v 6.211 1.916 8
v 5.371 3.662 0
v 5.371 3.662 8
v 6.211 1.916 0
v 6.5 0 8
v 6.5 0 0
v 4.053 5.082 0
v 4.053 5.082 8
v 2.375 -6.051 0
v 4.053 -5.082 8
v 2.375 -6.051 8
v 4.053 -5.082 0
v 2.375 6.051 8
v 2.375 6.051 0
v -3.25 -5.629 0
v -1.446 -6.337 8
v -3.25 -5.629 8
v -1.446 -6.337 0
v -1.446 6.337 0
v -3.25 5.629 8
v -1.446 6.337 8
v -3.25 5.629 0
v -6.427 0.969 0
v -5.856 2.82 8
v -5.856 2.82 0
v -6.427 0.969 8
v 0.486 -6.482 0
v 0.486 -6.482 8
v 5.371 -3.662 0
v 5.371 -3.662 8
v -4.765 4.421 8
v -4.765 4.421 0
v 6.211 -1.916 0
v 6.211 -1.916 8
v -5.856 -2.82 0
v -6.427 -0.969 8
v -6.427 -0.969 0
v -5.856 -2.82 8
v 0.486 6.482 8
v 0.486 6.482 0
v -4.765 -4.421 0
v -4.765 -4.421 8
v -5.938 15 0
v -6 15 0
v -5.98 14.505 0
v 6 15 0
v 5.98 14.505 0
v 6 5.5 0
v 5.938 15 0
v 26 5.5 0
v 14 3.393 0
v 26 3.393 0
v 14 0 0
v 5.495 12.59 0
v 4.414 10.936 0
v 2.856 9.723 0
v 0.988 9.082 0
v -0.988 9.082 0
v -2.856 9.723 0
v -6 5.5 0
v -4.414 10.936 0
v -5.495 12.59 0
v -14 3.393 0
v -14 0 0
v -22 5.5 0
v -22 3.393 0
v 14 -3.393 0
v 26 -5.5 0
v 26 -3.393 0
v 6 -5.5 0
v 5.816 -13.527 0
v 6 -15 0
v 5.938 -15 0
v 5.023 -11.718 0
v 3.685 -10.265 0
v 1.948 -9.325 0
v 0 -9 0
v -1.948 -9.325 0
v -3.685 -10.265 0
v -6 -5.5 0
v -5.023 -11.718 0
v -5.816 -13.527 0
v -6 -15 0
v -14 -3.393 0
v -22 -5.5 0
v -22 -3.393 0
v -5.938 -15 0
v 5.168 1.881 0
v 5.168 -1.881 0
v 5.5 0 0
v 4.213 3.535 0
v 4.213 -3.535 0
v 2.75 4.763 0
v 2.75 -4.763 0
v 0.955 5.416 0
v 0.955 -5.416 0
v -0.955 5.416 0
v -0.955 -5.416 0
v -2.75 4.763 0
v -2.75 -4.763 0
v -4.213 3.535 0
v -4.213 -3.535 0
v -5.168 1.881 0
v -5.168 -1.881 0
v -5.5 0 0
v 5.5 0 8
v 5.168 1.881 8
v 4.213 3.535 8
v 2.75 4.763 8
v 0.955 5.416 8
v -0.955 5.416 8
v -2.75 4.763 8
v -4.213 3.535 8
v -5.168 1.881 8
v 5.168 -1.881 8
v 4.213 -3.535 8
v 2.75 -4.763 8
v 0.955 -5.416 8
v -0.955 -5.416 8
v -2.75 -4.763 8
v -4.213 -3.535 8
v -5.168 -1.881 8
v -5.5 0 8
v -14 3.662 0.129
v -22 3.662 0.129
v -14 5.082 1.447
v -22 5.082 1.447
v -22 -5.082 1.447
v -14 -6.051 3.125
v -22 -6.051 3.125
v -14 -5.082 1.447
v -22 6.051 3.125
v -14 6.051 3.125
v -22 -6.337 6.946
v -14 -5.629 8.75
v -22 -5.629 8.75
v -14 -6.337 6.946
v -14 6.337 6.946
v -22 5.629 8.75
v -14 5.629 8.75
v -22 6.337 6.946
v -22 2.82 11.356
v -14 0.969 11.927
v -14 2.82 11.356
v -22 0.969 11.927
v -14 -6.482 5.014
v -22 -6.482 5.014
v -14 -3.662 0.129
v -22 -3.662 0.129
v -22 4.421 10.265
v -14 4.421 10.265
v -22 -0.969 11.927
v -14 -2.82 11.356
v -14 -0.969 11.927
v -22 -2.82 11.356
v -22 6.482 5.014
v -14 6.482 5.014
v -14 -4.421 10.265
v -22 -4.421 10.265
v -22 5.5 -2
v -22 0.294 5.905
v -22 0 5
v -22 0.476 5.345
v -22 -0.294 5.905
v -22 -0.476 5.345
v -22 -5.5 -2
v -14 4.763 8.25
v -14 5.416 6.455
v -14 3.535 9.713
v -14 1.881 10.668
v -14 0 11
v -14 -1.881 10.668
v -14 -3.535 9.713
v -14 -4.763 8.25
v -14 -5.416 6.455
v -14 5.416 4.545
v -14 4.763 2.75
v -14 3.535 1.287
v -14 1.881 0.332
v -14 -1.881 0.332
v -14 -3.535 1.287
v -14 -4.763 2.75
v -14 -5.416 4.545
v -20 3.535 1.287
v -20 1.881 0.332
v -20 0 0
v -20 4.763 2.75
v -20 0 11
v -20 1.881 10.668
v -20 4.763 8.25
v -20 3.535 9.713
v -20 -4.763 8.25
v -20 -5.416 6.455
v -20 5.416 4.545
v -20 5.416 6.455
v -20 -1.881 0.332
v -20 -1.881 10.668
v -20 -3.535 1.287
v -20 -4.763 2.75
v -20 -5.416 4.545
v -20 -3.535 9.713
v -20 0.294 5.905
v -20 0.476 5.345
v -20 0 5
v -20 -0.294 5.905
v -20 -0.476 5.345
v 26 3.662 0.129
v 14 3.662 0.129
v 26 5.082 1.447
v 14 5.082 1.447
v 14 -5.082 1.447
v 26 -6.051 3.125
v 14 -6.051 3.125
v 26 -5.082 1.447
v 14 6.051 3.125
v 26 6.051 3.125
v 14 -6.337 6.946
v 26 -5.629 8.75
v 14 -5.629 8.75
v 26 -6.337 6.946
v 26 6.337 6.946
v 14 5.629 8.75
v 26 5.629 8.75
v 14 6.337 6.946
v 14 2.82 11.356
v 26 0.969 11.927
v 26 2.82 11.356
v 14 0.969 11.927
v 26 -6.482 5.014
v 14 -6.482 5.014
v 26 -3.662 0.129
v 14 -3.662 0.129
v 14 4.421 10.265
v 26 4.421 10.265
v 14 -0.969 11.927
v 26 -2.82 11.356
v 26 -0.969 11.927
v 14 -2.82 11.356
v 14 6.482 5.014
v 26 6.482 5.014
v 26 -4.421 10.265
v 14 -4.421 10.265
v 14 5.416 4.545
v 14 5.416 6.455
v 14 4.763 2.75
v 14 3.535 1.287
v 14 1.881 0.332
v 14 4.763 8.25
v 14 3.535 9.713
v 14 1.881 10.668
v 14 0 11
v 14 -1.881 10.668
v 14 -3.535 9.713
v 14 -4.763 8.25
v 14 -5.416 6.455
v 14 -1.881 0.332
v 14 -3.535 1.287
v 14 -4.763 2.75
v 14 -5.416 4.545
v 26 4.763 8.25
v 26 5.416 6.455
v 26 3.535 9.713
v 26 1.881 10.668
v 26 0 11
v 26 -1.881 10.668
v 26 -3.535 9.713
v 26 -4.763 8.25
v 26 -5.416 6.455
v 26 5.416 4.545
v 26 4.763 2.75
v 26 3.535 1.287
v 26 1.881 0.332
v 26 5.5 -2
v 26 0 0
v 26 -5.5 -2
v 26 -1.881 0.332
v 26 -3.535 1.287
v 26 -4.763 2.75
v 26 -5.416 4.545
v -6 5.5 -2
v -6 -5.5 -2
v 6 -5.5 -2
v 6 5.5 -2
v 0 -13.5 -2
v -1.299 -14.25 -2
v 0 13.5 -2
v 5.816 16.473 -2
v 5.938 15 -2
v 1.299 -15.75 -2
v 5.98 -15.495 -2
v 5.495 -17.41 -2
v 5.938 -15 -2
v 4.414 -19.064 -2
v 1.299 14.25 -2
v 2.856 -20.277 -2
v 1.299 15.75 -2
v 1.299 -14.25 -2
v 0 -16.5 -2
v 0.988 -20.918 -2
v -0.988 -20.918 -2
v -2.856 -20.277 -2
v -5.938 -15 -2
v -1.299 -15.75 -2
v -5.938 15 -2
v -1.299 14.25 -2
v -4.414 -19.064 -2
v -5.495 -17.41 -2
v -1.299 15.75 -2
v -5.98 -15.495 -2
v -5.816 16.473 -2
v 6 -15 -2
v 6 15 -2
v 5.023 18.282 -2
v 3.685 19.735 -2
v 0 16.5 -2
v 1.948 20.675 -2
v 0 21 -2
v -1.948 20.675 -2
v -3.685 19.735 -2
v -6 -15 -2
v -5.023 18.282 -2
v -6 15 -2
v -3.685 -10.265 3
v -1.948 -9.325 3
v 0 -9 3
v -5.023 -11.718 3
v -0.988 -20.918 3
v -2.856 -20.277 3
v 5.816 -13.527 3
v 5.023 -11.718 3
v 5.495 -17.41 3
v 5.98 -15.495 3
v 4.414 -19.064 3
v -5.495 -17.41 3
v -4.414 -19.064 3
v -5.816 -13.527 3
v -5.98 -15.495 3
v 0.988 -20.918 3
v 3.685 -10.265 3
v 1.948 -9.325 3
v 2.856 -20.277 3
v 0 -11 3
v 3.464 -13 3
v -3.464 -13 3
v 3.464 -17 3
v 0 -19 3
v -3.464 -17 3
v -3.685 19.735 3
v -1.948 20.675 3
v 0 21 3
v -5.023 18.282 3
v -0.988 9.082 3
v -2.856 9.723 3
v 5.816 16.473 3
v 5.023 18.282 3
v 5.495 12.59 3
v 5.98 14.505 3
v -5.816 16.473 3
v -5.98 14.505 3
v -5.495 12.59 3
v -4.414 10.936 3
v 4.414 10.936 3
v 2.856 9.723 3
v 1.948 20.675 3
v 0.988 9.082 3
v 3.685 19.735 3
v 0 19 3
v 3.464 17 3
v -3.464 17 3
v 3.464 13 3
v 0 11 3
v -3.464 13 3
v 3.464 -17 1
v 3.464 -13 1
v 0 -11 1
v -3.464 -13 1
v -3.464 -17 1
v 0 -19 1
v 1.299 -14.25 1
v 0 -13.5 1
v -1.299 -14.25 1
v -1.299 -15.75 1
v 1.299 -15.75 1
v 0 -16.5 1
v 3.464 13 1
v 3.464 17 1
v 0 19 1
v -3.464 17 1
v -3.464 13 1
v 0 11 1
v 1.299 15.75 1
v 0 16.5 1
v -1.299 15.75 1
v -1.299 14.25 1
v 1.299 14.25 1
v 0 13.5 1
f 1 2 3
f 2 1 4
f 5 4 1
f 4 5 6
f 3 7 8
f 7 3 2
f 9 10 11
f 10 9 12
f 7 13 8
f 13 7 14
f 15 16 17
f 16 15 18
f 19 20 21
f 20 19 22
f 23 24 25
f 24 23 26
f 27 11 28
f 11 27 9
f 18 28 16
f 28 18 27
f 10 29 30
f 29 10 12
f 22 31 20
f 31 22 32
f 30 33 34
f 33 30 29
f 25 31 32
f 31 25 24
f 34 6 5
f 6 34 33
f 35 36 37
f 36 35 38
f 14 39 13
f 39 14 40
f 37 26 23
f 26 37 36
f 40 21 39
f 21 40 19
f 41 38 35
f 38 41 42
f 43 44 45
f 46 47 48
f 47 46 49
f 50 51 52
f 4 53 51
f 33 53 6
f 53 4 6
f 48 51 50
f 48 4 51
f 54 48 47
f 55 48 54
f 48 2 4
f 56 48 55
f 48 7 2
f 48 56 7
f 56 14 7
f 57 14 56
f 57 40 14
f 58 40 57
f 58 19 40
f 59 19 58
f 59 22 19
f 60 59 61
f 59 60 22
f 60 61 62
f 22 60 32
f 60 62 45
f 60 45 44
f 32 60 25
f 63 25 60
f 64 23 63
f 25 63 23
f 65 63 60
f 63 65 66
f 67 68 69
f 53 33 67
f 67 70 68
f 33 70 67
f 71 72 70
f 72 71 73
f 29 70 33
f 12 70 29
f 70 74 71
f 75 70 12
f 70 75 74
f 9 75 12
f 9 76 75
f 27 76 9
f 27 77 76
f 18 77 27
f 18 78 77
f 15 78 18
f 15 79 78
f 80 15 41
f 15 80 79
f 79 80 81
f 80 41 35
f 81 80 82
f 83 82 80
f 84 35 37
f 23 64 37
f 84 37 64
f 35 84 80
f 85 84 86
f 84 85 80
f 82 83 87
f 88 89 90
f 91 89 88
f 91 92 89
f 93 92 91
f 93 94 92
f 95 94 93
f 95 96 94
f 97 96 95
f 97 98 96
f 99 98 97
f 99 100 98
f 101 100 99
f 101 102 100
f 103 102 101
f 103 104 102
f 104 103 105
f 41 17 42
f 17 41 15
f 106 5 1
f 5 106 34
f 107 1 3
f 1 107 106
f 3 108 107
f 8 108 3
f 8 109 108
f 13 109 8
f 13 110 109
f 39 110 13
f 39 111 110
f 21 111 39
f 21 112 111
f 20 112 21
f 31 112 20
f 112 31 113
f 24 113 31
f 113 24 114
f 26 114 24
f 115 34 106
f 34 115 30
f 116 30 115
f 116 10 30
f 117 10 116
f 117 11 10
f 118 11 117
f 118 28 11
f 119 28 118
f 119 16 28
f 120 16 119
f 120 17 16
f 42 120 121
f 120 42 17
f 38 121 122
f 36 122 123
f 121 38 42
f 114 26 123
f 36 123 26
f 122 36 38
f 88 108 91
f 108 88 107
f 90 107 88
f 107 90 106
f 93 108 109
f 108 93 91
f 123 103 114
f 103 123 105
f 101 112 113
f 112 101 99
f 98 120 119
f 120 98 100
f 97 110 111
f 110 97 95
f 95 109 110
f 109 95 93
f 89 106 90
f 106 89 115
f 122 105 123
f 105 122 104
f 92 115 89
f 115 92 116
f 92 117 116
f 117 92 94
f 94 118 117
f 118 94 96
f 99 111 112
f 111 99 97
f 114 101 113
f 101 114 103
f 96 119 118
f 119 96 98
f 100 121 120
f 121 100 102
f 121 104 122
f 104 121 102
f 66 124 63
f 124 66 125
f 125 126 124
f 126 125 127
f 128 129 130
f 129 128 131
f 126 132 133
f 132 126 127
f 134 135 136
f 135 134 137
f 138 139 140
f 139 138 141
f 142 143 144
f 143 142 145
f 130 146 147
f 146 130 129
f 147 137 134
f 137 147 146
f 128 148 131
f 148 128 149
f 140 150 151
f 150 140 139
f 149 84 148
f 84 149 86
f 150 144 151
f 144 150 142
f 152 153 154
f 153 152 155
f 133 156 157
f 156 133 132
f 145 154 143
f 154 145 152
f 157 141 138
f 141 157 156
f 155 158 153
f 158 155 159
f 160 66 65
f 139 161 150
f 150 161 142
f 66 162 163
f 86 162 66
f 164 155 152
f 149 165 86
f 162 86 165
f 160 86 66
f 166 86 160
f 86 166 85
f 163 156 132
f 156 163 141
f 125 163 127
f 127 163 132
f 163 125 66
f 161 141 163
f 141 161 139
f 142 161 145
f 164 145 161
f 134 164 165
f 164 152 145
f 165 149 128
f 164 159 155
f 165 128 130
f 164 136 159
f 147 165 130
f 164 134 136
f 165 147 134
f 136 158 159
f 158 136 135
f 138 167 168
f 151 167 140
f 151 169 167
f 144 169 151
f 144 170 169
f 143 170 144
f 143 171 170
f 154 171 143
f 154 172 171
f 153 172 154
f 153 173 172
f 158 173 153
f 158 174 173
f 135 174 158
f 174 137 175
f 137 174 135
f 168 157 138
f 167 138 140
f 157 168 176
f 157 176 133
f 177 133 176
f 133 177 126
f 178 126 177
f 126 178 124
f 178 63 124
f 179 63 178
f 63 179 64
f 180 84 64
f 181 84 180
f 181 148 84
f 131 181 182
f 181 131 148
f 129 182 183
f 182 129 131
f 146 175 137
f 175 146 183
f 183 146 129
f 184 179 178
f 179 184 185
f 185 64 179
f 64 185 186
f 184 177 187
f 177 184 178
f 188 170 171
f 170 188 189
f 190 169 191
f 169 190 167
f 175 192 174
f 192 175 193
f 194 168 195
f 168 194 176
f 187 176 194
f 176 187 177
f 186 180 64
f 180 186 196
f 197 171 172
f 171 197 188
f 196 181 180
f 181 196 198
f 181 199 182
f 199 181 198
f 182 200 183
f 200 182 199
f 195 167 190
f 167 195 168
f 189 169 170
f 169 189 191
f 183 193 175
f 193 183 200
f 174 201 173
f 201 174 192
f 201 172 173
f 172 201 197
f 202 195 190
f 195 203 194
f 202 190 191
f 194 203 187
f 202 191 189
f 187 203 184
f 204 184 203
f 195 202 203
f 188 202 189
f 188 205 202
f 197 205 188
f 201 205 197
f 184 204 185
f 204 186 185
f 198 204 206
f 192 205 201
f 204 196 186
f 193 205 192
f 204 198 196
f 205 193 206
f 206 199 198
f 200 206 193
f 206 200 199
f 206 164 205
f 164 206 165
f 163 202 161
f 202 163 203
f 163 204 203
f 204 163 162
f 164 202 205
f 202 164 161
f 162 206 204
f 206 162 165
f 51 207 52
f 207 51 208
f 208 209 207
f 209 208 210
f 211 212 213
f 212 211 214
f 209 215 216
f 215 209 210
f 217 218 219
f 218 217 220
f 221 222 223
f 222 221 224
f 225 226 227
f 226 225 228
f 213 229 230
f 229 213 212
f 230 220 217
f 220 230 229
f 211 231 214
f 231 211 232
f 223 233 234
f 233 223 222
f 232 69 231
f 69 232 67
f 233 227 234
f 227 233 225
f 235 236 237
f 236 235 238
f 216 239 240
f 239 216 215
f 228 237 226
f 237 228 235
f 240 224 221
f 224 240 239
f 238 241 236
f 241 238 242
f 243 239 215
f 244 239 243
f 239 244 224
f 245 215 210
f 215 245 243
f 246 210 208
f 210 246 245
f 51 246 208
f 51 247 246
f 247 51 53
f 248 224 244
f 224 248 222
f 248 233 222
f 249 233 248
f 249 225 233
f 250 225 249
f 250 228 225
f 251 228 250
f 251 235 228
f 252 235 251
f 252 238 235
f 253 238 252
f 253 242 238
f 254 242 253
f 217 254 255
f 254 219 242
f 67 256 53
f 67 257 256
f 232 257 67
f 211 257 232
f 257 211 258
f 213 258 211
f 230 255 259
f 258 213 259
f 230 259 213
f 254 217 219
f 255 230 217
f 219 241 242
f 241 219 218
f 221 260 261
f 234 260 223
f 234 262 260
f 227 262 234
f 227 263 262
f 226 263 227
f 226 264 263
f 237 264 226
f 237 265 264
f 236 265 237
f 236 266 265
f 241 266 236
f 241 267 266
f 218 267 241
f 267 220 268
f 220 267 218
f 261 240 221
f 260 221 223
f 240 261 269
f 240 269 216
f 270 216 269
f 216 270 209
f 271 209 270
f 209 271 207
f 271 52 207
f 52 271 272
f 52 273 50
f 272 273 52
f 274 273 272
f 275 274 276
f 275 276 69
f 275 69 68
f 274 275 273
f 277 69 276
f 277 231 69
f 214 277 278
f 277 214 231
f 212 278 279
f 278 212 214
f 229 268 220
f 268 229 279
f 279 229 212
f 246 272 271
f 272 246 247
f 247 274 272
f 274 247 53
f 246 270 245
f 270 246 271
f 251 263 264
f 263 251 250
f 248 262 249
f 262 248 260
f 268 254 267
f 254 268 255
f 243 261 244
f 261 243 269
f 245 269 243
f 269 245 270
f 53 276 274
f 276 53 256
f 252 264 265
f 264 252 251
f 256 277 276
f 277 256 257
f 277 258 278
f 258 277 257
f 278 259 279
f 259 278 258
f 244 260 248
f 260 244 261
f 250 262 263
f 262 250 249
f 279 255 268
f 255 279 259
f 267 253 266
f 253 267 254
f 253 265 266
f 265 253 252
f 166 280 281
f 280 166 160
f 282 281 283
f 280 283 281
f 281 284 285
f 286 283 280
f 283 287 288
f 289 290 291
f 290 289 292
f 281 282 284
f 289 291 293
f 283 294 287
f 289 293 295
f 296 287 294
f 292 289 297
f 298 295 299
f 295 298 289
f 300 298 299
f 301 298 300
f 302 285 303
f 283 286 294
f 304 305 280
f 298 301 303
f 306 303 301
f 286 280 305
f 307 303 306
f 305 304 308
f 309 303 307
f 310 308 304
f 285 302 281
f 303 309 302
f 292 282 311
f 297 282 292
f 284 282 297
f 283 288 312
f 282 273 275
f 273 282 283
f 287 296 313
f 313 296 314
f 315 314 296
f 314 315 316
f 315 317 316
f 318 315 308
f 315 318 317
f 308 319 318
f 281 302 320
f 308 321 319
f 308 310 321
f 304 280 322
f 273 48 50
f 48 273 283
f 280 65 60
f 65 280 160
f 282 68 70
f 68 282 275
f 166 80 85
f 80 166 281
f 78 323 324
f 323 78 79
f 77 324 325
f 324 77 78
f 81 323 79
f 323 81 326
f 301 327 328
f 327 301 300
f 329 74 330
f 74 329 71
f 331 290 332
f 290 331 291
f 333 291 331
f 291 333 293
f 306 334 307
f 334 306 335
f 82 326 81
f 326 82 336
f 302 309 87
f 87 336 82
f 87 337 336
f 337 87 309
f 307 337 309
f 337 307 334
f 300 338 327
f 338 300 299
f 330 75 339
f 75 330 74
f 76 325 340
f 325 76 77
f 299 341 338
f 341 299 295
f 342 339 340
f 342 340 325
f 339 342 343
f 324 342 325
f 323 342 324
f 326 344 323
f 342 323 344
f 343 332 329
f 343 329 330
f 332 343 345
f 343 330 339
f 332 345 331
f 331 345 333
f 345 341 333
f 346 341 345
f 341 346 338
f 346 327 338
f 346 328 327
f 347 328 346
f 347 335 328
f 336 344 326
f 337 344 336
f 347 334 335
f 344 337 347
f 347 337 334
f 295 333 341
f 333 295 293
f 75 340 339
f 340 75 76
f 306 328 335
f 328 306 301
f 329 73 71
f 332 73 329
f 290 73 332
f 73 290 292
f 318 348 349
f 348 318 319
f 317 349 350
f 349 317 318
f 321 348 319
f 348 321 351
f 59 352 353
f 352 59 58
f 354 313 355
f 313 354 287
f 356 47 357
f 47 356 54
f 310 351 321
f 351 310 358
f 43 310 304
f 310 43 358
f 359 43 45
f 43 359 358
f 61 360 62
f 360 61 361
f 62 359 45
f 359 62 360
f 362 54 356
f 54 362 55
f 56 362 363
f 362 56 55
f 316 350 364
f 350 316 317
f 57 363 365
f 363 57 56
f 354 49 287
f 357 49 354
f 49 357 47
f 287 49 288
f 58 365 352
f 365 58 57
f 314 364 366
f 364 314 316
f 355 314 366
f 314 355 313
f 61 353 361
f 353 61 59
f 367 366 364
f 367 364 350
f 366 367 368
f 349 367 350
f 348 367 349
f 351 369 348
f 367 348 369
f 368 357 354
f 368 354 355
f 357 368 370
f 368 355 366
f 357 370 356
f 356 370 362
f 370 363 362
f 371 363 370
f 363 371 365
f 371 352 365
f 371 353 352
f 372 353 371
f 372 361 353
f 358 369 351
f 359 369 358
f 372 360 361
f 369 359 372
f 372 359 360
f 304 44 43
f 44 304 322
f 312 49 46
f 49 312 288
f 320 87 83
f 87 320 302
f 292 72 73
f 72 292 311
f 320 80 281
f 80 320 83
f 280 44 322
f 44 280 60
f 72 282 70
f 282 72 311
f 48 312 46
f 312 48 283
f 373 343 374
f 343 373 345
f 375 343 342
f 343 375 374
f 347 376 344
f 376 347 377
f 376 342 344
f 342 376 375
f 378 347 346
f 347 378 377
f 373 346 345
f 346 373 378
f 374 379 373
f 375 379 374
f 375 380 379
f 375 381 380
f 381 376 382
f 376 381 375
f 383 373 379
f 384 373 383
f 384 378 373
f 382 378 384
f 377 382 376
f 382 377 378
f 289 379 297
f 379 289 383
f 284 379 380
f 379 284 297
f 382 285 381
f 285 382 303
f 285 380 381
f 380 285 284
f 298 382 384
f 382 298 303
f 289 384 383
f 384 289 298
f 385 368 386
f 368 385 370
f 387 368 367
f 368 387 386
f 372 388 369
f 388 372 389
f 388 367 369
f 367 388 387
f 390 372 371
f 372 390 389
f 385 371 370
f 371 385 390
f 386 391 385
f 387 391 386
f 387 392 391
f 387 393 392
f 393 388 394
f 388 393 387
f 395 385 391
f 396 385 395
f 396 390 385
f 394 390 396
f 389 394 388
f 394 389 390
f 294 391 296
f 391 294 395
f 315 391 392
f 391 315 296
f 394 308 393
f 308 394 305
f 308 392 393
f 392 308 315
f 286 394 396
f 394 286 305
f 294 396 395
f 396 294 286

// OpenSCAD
module tube(h,d,t){
    translate([0,0,h/2])
    difference(){
    cylinder(d=d+t,h=h,center=true);
    cylinder(d=d,h=h+t,center=true);
    }
}

module filled(h,d,t){
    difference(){
       union(){
            tube(h,d,t);
            cylinder(d=d+t,h=2);
       }
    cylinder(r=.5,h=t+t,center=true);
    }
}

module connect(h,d,t){
    difference(){
    tube(h,d,t); 
   // translate([44/2+t,-d/2,d/2])cube([t,d,d]);
    }
}

connect(8,11,2);

module bat(h,d,t,l){
    translate([-l/2,0,0])
    rotate([0,90,0])
translate([-d/2,0,0])
    {
filled(h,d,t);
translate([0,0,l-h])connect(h+h/2,d,t);
translate([d/2,-d/2,0])cube([t,d,l+h/2]);
}
}




module pad(h,pd,t){
    translate([0,0,-t])
       cylinder(d=pd,h=h);
}


module drill(h,t){
  nutDiam=8;
  boltDiam = 3;
  translate([0,0,h-t-t])cylinder(d=nutDiam,h=t*1.1,$fn=6);
  translate([0,0,-1.1*t])cylinder(d=boltDiam,h=1.1*h, $fn=6);  

}


module bracket(h,m3,t,bh,pd){
h = 5;
m3=3;
t=2;
bh=30;
pd=12;
rotate([0,0,90])
translate([-bh/2,0,0])
difference(){
  union(){
    translate([0,-pd/2,-t])cube([bh,pd,t]);
    for(i=[0,bh])translate([i,0,0])pad(h,pd,t);
}
for (i=[0,bh])
    translate([i,0,0]) drill(h,t);
}
}

bat(8,11,2,44);
bracket(8,3,30,44);
